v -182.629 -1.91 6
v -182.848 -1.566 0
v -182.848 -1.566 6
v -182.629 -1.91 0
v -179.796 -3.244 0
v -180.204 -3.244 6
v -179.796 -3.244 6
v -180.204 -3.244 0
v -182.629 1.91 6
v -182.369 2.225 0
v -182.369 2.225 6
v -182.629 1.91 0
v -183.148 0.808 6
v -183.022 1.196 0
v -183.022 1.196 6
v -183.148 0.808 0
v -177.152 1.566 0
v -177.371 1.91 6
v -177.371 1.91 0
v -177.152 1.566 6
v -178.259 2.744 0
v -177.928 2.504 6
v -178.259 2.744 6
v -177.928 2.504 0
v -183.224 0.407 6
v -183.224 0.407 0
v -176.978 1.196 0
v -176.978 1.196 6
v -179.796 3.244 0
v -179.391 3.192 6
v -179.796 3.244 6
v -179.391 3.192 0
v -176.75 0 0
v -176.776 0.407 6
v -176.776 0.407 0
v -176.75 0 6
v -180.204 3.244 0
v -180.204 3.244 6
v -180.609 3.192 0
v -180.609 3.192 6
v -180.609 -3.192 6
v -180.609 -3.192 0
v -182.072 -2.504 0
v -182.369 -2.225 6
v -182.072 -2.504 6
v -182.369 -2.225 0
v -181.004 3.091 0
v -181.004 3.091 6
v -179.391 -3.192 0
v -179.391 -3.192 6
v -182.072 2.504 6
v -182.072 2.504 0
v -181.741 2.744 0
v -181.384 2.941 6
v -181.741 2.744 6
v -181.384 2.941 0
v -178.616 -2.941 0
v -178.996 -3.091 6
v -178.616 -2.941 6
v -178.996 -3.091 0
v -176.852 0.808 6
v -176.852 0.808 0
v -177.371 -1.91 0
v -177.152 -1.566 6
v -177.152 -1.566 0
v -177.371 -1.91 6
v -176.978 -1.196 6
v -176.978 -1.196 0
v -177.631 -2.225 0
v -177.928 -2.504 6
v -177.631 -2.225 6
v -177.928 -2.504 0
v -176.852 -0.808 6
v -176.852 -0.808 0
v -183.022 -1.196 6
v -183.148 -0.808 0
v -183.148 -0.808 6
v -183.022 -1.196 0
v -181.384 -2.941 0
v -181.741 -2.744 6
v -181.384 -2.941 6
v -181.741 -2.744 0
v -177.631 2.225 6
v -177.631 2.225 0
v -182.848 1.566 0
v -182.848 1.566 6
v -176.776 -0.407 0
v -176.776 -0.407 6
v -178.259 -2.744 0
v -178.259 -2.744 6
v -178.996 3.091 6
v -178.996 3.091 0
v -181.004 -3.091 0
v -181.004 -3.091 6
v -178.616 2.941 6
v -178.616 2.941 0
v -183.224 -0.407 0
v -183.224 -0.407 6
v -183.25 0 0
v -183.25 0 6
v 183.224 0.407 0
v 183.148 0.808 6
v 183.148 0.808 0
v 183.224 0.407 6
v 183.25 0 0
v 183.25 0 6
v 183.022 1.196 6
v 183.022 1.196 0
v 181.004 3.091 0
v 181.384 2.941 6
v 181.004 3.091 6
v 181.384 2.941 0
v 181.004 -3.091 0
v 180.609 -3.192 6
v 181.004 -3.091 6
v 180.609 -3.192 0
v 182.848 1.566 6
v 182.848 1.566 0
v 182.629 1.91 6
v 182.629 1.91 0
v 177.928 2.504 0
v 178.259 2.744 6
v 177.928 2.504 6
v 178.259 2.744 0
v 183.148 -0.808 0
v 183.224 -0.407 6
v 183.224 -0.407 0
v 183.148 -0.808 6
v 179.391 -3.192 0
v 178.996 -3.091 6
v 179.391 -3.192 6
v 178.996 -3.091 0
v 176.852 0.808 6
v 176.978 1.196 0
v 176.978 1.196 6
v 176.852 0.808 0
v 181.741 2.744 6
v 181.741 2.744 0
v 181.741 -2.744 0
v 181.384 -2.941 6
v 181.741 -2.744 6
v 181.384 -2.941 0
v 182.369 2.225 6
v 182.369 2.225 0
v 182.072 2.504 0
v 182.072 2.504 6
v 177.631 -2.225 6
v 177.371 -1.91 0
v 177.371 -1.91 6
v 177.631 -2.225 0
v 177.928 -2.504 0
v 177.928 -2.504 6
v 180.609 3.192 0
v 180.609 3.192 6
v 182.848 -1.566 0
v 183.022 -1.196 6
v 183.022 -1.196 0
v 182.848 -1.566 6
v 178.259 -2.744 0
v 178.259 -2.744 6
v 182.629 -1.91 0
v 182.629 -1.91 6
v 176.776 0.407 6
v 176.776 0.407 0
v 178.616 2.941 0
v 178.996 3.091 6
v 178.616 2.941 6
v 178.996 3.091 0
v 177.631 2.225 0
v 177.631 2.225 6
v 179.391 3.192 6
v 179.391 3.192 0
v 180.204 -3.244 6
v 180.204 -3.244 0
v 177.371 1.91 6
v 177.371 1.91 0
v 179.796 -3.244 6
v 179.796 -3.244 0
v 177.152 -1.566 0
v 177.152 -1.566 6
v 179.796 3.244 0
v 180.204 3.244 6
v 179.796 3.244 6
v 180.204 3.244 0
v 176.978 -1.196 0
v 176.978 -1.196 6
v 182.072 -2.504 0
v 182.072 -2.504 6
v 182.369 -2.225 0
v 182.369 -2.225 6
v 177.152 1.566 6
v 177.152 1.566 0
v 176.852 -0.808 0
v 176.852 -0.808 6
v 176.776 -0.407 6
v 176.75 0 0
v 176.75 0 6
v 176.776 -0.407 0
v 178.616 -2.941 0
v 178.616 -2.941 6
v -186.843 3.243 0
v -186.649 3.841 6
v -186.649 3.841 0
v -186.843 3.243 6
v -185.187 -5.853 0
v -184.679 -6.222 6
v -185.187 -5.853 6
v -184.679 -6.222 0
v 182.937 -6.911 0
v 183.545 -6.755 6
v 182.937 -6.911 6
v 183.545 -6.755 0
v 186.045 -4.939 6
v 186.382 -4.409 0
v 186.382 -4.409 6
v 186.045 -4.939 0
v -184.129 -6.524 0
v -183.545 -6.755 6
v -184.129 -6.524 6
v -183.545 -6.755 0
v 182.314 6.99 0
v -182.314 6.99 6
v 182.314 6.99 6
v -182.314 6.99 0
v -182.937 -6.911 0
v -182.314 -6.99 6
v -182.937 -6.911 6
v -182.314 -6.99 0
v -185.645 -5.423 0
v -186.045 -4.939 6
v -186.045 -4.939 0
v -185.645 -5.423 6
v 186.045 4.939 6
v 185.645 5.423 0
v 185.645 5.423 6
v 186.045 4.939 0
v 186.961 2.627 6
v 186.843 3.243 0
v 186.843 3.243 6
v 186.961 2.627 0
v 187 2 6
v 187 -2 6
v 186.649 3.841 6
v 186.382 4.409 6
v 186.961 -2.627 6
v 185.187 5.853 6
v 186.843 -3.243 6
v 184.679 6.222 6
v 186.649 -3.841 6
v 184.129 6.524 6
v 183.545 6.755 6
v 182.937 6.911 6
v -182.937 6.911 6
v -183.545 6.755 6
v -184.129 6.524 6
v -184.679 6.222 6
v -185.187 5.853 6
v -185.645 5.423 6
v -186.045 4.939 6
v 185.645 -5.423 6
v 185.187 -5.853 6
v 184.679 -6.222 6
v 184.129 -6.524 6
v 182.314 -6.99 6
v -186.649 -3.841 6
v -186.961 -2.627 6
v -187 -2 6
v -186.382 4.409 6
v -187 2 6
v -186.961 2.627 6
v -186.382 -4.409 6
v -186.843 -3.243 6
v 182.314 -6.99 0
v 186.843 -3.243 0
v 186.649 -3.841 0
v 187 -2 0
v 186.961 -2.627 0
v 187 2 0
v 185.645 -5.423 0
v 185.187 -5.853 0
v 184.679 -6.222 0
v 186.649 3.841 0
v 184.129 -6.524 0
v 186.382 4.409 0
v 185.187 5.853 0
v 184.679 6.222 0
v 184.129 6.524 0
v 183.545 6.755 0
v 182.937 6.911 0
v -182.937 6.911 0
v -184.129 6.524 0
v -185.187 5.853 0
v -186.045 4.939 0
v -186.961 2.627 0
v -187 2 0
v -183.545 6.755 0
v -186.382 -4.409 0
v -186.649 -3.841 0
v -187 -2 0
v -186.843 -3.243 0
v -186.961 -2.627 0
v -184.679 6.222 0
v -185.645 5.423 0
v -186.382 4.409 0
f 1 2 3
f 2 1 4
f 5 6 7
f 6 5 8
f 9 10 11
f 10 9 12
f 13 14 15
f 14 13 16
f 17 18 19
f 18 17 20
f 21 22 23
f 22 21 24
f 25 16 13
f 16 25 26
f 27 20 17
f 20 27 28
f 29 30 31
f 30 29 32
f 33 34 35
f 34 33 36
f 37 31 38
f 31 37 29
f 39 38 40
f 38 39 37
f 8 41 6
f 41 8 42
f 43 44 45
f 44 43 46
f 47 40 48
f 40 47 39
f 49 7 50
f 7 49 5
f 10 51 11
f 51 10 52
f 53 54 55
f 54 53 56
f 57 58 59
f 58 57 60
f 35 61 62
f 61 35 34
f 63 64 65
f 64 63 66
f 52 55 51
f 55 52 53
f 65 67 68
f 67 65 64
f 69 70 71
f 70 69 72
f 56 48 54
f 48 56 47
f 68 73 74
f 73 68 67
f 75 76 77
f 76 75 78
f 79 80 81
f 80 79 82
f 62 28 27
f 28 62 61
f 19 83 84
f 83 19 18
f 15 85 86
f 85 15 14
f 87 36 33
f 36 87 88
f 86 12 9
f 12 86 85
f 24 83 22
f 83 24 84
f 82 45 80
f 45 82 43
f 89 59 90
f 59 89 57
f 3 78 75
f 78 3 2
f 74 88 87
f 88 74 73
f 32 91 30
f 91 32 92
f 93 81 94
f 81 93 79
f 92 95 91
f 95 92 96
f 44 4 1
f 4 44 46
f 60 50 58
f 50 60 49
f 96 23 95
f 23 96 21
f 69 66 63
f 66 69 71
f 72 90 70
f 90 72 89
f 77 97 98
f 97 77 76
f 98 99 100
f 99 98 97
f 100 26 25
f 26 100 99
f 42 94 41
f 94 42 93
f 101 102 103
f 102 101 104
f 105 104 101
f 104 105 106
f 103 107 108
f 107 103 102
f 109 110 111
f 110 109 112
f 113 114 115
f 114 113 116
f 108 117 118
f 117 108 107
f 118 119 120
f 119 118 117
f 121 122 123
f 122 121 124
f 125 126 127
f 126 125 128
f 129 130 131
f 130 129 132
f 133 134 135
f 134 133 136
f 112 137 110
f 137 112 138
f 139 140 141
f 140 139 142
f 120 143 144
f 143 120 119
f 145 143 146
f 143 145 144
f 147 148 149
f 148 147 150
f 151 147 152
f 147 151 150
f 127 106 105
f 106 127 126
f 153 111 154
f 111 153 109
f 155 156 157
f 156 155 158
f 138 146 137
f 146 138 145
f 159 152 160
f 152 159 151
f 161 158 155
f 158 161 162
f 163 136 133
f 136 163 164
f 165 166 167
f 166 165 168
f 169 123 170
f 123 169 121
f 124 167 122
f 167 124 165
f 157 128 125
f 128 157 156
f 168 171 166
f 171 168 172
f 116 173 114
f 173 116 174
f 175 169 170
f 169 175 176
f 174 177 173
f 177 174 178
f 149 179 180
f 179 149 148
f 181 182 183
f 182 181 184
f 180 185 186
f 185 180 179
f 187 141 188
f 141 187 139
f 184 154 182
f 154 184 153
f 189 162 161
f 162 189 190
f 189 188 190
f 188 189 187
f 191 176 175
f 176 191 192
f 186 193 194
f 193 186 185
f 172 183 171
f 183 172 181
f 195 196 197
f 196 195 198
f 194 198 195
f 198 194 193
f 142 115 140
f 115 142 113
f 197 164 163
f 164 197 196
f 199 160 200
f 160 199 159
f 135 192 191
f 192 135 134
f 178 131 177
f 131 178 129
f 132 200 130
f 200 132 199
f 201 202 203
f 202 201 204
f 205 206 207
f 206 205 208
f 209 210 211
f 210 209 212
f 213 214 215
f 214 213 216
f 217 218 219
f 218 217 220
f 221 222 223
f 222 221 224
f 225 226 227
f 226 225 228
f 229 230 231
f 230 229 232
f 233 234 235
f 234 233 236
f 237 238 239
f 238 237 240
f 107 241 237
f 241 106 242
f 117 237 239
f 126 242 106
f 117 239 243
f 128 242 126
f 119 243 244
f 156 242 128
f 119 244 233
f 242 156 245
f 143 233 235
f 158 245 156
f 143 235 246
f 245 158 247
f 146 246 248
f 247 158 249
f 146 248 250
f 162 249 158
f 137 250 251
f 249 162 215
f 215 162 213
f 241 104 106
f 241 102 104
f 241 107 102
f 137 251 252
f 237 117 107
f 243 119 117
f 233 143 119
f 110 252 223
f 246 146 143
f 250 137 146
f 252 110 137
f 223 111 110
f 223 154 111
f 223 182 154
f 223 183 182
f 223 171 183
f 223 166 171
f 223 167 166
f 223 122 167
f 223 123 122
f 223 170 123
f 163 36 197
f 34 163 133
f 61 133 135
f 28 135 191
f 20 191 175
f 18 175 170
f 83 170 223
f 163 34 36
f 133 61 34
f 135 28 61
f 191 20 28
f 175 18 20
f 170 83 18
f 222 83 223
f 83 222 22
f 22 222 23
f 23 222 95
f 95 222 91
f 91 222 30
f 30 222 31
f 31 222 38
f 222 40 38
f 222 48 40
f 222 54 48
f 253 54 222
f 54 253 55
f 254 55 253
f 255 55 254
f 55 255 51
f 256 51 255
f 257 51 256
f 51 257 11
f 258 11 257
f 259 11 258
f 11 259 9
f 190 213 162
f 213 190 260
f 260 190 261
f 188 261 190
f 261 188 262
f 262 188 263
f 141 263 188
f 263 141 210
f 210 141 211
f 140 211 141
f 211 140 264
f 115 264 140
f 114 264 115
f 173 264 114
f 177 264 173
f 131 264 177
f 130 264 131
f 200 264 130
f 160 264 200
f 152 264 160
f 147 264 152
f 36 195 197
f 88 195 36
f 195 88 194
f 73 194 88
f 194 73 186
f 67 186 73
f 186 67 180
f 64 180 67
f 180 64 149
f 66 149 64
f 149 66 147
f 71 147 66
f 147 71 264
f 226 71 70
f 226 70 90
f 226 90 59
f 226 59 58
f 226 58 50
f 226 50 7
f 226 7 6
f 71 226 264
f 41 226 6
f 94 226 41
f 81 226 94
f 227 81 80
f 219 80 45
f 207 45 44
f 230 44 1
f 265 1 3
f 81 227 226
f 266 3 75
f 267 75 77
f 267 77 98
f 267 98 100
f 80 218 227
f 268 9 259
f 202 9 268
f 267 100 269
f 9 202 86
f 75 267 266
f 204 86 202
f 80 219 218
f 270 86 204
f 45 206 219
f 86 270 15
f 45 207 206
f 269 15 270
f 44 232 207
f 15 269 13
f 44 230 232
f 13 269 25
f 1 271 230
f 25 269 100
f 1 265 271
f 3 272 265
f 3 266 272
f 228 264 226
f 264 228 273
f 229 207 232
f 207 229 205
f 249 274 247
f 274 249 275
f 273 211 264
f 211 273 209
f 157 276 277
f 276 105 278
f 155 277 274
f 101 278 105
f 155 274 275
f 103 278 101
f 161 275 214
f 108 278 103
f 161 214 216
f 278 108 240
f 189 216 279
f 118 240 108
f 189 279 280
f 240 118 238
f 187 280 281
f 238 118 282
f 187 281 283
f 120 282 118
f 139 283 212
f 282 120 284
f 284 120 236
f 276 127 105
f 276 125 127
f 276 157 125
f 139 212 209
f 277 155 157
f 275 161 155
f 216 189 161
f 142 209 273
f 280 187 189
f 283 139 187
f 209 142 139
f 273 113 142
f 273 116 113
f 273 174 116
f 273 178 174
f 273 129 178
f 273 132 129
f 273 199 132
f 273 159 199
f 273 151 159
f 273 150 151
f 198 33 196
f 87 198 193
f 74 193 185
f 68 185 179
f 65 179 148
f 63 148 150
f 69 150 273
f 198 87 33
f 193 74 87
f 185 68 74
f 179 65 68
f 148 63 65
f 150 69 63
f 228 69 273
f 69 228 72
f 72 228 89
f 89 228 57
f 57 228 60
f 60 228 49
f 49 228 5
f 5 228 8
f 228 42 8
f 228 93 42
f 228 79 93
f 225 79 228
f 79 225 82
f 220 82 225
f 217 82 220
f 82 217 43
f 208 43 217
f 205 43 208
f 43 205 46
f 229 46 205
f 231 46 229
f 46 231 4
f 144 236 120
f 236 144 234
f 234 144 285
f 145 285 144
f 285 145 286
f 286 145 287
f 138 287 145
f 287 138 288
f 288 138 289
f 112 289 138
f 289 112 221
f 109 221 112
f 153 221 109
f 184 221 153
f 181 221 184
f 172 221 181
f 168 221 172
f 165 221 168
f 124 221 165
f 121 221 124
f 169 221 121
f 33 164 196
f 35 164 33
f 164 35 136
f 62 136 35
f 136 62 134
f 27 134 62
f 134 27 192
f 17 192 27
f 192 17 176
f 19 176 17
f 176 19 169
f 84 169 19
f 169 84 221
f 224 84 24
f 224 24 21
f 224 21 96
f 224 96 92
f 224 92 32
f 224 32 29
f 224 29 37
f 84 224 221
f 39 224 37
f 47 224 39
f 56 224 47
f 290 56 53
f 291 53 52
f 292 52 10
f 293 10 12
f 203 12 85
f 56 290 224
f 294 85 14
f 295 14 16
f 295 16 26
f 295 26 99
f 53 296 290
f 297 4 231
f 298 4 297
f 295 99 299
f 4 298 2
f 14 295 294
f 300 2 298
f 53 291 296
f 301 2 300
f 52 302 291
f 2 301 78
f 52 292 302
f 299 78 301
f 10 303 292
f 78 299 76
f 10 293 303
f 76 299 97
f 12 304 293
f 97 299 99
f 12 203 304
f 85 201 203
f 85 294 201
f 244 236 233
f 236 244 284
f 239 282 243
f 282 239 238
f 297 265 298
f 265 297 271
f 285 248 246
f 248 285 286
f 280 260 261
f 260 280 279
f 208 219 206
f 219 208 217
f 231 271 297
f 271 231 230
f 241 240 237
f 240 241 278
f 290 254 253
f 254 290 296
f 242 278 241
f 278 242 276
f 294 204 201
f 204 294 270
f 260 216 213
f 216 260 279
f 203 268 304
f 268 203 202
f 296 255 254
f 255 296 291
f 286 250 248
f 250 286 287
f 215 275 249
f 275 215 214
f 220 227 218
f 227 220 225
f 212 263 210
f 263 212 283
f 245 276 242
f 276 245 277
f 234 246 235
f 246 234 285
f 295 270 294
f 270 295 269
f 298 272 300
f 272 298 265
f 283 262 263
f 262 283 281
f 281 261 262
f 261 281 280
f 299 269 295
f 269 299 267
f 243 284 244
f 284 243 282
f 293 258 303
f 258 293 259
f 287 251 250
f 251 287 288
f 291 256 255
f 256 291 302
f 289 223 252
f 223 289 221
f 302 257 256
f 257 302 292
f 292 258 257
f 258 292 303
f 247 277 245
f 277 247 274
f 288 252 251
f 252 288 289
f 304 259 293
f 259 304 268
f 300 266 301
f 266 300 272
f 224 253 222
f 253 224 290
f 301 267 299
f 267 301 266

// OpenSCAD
$fn = 50;


difference() {
	union() {
		hull() {
			translate(v = [-182.0000000000, 2.0000000000, 0]) {
				cylinder(h = 6, r = 5);
			}
			translate(v = [182.0000000000, 2.0000000000, 0]) {
				cylinder(h = 6, r = 5);
			}
			translate(v = [-182.0000000000, -2.0000000000, 0]) {
				cylinder(h = 6, r = 5);
			}
			translate(v = [182.0000000000, -2.0000000000, 0]) {
				cylinder(h = 6, r = 5);
			}
		}
	}
	union() {
		translate(v = [-180.0000000000, 0.0000000000, -100.0000000000]) {
			cylinder(h = 200, r = 3.2500000000);
		}
		translate(v = [-180.0000000000, 0.0000000000, -100.0000000000]) {
			cylinder(h = 200, r = 3.2500000000);
		}
		translate(v = [180.0000000000, 0.0000000000, -100.0000000000]) {
			cylinder(h = 200, r = 3.2500000000);
		}
		translate(v = [180.0000000000, 0.0000000000, -100.0000000000]) {
			cylinder(h = 200, r = 3.2500000000);
		}
	}
}
